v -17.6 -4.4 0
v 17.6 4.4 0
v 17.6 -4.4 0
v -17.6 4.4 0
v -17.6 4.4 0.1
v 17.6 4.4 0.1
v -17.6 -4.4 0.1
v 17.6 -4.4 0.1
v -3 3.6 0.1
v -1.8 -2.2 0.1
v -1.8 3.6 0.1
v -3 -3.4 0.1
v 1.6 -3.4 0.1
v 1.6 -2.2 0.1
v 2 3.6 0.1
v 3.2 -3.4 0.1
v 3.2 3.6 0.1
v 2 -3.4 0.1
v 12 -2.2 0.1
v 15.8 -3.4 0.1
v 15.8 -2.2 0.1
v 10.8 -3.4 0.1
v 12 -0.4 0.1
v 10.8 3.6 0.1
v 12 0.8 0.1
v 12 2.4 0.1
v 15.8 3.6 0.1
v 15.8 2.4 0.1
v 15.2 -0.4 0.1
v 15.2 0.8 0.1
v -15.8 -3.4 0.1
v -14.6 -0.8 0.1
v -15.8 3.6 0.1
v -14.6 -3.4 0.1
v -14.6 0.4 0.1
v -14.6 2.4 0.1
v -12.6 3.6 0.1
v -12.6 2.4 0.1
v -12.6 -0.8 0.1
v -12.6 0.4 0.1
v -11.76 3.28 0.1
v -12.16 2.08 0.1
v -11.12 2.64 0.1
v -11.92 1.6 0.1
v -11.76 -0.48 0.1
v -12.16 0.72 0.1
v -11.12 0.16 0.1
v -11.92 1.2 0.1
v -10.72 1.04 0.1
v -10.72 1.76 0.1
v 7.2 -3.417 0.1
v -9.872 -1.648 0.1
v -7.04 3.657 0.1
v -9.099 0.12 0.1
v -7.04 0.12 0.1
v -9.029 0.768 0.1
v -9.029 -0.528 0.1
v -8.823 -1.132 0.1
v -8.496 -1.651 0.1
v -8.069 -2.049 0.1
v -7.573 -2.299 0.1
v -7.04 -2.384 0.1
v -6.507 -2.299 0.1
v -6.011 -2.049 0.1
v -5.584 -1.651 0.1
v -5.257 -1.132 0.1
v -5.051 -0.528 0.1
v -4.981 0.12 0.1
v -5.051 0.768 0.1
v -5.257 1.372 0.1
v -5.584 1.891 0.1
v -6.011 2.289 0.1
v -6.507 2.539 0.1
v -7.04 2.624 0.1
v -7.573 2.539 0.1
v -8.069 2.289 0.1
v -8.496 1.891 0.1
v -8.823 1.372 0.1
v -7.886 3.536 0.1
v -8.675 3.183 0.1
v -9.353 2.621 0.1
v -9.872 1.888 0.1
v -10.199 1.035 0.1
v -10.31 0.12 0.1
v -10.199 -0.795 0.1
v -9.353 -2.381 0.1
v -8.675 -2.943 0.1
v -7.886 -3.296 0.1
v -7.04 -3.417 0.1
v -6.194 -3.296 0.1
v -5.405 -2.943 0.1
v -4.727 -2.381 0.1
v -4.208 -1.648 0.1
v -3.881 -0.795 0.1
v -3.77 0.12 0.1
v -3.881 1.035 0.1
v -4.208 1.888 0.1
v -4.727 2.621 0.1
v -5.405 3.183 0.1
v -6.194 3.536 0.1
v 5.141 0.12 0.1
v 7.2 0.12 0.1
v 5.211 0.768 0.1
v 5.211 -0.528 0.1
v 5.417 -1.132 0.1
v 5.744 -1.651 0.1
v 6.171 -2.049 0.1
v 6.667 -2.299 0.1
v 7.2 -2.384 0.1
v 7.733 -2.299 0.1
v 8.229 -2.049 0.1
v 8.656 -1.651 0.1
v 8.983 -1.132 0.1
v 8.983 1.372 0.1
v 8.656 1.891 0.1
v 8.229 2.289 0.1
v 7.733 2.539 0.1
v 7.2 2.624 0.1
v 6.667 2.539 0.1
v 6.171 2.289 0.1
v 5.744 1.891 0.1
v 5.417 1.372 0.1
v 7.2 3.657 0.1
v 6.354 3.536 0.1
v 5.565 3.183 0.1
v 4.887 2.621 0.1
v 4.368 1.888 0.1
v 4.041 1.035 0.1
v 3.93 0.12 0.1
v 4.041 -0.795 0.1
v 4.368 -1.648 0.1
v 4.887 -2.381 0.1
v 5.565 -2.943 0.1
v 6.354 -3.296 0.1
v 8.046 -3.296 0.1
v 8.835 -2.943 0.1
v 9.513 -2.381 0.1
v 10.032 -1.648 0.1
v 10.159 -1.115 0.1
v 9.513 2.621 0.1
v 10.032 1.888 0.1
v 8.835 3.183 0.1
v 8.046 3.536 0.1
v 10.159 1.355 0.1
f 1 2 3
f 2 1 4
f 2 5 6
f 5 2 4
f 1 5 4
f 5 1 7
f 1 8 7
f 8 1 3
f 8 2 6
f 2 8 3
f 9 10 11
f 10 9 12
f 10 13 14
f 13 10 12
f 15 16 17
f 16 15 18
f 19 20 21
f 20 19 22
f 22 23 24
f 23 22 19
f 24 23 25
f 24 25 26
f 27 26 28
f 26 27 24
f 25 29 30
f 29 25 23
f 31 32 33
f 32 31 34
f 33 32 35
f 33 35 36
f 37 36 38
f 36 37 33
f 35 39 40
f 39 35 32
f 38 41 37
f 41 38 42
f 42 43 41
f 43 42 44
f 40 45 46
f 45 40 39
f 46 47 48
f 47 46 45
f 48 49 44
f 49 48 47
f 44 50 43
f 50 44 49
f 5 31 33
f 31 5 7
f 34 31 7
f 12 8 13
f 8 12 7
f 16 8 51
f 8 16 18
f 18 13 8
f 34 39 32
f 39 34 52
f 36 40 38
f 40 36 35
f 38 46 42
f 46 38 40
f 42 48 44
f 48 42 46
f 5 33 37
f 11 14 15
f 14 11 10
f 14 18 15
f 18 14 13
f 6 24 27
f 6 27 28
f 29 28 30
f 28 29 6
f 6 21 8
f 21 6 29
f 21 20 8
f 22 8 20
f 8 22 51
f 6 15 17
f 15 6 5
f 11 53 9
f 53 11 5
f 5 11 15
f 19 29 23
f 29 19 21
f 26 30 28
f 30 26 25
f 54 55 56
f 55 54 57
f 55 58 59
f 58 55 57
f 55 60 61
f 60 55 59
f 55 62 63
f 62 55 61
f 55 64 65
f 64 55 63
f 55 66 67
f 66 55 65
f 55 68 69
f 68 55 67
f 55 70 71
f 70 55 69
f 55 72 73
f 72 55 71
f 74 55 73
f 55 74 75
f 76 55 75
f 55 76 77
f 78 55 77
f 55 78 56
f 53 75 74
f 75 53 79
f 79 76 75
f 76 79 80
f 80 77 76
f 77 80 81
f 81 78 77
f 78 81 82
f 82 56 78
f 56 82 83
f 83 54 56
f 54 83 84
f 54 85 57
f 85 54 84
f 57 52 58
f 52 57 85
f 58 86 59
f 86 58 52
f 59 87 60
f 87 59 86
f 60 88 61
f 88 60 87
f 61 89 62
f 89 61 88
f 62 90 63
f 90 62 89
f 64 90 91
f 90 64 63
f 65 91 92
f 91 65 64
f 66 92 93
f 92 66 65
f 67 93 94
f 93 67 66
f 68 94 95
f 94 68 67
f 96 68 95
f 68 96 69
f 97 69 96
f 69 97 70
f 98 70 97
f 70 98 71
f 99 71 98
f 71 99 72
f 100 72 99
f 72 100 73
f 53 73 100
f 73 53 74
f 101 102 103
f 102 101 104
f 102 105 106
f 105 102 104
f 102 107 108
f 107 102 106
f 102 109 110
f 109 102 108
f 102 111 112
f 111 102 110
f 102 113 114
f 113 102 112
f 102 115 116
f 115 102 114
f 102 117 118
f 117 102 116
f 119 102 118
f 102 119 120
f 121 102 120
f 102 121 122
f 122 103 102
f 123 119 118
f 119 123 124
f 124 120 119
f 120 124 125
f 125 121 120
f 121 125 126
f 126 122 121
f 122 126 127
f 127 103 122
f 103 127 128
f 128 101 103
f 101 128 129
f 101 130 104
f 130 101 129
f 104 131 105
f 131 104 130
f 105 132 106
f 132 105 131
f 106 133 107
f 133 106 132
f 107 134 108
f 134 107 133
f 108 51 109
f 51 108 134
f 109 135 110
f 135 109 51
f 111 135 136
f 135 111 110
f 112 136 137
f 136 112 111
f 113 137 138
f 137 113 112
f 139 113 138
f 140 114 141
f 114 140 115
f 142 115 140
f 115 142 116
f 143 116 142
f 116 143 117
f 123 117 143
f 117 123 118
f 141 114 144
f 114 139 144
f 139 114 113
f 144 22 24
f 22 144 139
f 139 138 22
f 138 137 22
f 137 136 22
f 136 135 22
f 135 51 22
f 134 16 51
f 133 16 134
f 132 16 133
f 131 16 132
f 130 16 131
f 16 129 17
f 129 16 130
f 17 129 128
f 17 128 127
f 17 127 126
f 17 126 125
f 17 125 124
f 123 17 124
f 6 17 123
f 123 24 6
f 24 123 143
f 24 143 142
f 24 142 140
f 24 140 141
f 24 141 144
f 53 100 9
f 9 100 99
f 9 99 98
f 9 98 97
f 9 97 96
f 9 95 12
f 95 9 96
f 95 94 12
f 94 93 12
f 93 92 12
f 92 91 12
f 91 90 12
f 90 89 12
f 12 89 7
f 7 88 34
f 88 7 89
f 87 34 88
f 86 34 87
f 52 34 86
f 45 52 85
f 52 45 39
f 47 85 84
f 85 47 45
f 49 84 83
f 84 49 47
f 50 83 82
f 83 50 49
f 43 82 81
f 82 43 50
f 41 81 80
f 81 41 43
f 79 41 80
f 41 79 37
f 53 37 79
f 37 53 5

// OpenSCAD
// file: ../p/box5-12.scad
use <../lib.scad>
function ldraw_lib__box5_12() = [
// 0 Box with 5 Faces without Any Edges
// 0 Name: box5-12.dat
// 0 Author: Chris Dee [cwdee]
// 0 !LDRAW_ORG Primitive UPDATE 2009-02
// 0 !LICENSE Licensed under CC BY 4.0 : see CAreadme.txt
// 
// 0 BFC CERTIFY CCW
  [0,"BFC","CERTIFY"],
  [0,"BFC","CCW"],
// 
// 0 !HISTORY 2009-09-03 [PTadmin] Official Update 2009-02
// 
// 
// 4 16 1 1 1 1 1 -1 -1 1 -1 -1 1 1
  [4,16,1,1,1,1,1,-1,-1,1,-1,-1,1,1],
// 4 16 -1 0 1 1 0 1 1 1 1 -1 1 1
  [4,16,-1,0,1,1,0,1,1,1,1,-1,1,1],
// 4 16 -1 0 -1 -1 0 1 -1 1 1 -1 1 -1
  [4,16,-1,0,-1,-1,0,1,-1,1,1,-1,1,-1],
// 4 16 1 0 -1 -1 0 -1 -1 1 -1 1 1 -1
  [4,16,1,0,-1,-1,0,-1,-1,1,-1,1,1,-1],
// 4 16 1 0 1 1 0 -1 1 1 -1 1 1 1
  [4,16,1,0,1,1,0,-1,1,1,-1,1,1,1],
// 0
];
module ldraw_lib__box5_12(step=0, col=false, unit=2/5, alt=false, line=0.2, solid=!$preview)
    makepoly(ldraw_lib__box5_12(), step=step, col=col, unit=unit, alt=alt, line=line, solid=solid);
ldraw_lib__box5_12(line=0.2);
// main file
use <../lib.scad>
use <../p/box5-12.scad>
function ldraw_lib__197875a() = [
// 0 Sticker  1.1 x  4.4 with White "Police"
// 0 Name: 197875a.dat
// 0 Author: Philippe Hurbain [Philo]
// 0 !LDRAW_ORG Part UPDATE 2015-01
// 0 !LICENSE Licensed under CC BY 4.0 : see CAreadme.txt
// 
// 0 BFC CERTIFY CCW
  [0,"BFC","CERTIFY"],
  [0,"BFC","CCW"],
// 
// 0 !KEYWORDS Set 4010
// 
// 0 !HISTORY 2015-10-11 [PTadmin] Official Update 2015-01
// 
// 
// 1 16 0 -0.25 0 44 0 0 0 0.25 0 0 0 11 box5-12.dat
  [1,16,0,-0.25,0,44,0,0,0,0.25,0,0,0,11, ldraw_lib__box5_12()],
// 4 15 -4.5 -0.25 9 -7.5 -0.25 9 -7.5 -0.25 -8.5 -4.5 -0.25 -5.5
  [4,15,-4.5,-0.25,9,-7.5,-0.25,9,-7.5,-0.25,-8.5,-4.5,-0.25,-5.5],
// 4 15 4 -0.25 -5.5 -4.5 -0.25 -5.5 -7.5 -0.25 -8.5 4 -0.25 -8.5
  [4,15,4,-0.25,-5.5,-4.5,-0.25,-5.5,-7.5,-0.25,-8.5,4,-0.25,-8.5],
// 4 15 8 -0.25 9 5 -0.25 9 5 -0.25 -8.5 8 -0.25 -8.5
  [4,15,8,-0.25,9,5,-0.25,9,5,-0.25,-8.5,8,-0.25,-8.5],
// 4 15 39.5 -0.25 -5.5 30 -0.25 -5.5 27 -0.25 -8.5 39.5 -0.25 -8.5
  [4,15,39.5,-0.25,-5.5,30,-0.25,-5.5,27,-0.25,-8.5,39.5,-0.25,-8.5],
// 4 15 27 -0.25 -8.5 30 -0.25 -5.5 30 -0.25 -1 27 -0.25 9
  [4,15,27,-0.25,-8.5,30,-0.25,-5.5,30,-0.25,-1,27,-0.25,9],
// 3 15 27 -0.25 9 30 -0.25 -1 30 -0.25 2
  [3,15,27,-0.25,9,30,-0.25,-1,30,-0.25,2],
// 3 15 27 -0.25 9 30 -0.25 2 30 -0.25 6
  [3,15,27,-0.25,9,30,-0.25,2,30,-0.25,6],
// 4 15 39.5 -0.25 9 27 -0.25 9 30 -0.25 6 39.5 -0.25 6
  [4,15,39.5,-0.25,9,27,-0.25,9,30,-0.25,6,39.5,-0.25,6],
// 4 15 30 -0.25 2 30 -0.25 -1 38 -0.25 -1 38 -0.25 2
  [4,15,30,-0.25,2,30,-0.25,-1,38,-0.25,-1,38,-0.25,2],
// 4 15 -39.5 -0.25 -8.5 -36.5 -0.25 -8.5 -36.5 -0.25 -2 -39.5 -0.25 9
  [4,15,-39.5,-0.25,-8.5,-36.5,-0.25,-8.5,-36.5,-0.25,-2,-39.5,-0.25,9],
// 3 15 -39.5 -0.25 9 -36.5 -0.25 -2 -36.5 -0.25 1
  [3,15,-39.5,-0.25,9,-36.5,-0.25,-2,-36.5,-0.25,1],
// 3 15 -39.5 -0.25 9 -36.5 -0.25 1 -36.5 -0.25 6
  [3,15,-39.5,-0.25,9,-36.5,-0.25,1,-36.5,-0.25,6],
// 4 15 -31.5 -0.25 9 -39.5 -0.25 9 -36.5 -0.25 6 -31.5 -0.25 6
  [4,15,-31.5,-0.25,9,-39.5,-0.25,9,-36.5,-0.25,6,-31.5,-0.25,6],
// 4 15 -36.5 -0.25 1 -36.5 -0.25 -2 -31.5 -0.25 -2 -31.5 -0.25 1
  [4,15,-36.5,-0.25,1,-36.5,-0.25,-2,-31.5,-0.25,-2,-31.5,-0.25,1],
// 4 15 -31.5 -0.25 9 -31.5 -0.25 6 -30.4 -0.25 5.2 -29.4 -0.25 8.2
  [4,15,-31.5,-0.25,9,-31.5,-0.25,6,-30.4,-0.25,5.2,-29.4,-0.25,8.2],
// 4 15 -27.8 -0.25 6.6 -29.4 -0.25 8.2 -30.4 -0.25 5.2 -29.8 -0.25 4
  [4,15,-27.8,-0.25,6.6,-29.4,-0.25,8.2,-30.4,-0.25,5.2,-29.8,-0.25,4],
// 4 15 -30.4 -0.25 1.8 -31.5 -0.25 1 -31.5 -0.25 -2 -29.4 -0.25 -1.2
  [4,15,-30.4,-0.25,1.8,-31.5,-0.25,1,-31.5,-0.25,-2,-29.4,-0.25,-1.2],
// 4 15 -30.4 -0.25 1.8 -29.4 -0.25 -1.2 -27.8 -0.25 0.4 -29.8 -0.25 3
  [4,15,-30.4,-0.25,1.8,-29.4,-0.25,-1.2,-27.8,-0.25,0.4,-29.8,-0.25,3],
// 4 15 -29.8 -0.25 3 -27.8 -0.25 0.4 -26.8 -0.25 2.6 -29.8 -0.25 4
  [4,15,-29.8,-0.25,3,-27.8,-0.25,0.4,-26.8,-0.25,2.6,-29.8,-0.25,4],
// 4 15 -26.8 -0.25 4.4 -27.8 -0.25 6.6 -29.8 -0.25 4 -26.8 -0.25 2.6
  [4,15,-26.8,-0.25,4.4,-27.8,-0.25,6.6,-29.8,-0.25,4,-26.8,-0.25,2.6],
// 4 16 -39.5 -0.25 9 -44 -0.25 11 -44 -0.25 -11 -39.5 -0.25 -8.5
  [4,16,-39.5,-0.25,9,-44,-0.25,11,-44,-0.25,-11,-39.5,-0.25,-8.5],
// 3 16 -36.5 -0.25 -8.5 -39.5 -0.25 -8.5 -44 -0.25 -11
  [3,16,-36.5,-0.25,-8.5,-39.5,-0.25,-8.5,-44,-0.25,-11],
// 4 16 4 -0.25 -8.5 -7.5 -0.25 -8.5 -44 -0.25 -11 44 -0.25 -11
  [4,16,4,-0.25,-8.5,-7.5,-0.25,-8.5,-44,-0.25,-11,44,-0.25,-11],
// 4 16 8 -0.25 -8.5 5 -0.25 -8.5 44 -0.25 -11 18 -0.25 -8.542
  [4,16,8,-0.25,-8.5,5,-0.25,-8.5,44,-0.25,-11,18,-0.25,-8.542],
// 3 16 5 -0.25 -8.5 4 -0.25 -8.5 44 -0.25 -11
  [3,16,5,-0.25,-8.5,4,-0.25,-8.5,44,-0.25,-11],
// 4 16 -31.5 -0.25 -2 -36.5 -0.25 -2 -36.5 -0.25 -8.5 -24.6806 -0.25 -4.121
  [4,16,-31.5,-0.25,-2,-36.5,-0.25,-2,-36.5,-0.25,-8.5,-24.6806,-0.25,-4.121],
// 4 16 -31.5 -0.25 6 -36.5 -0.25 6 -36.5 -0.25 1 -31.5 -0.25 1
  [4,16,-31.5,-0.25,6,-36.5,-0.25,6,-36.5,-0.25,1,-31.5,-0.25,1],
// 4 16 -31.5 -0.25 6 -31.5 -0.25 1 -30.4 -0.25 1.8 -30.4 -0.25 5.2
  [4,16,-31.5,-0.25,6,-31.5,-0.25,1,-30.4,-0.25,1.8,-30.4,-0.25,5.2],
// 4 16 -29.8 -0.25 4 -30.4 -0.25 5.2 -30.4 -0.25 1.8 -29.8 -0.25 3
  [4,16,-29.8,-0.25,4,-30.4,-0.25,5.2,-30.4,-0.25,1.8,-29.8,-0.25,3],
// 3 16 -44 -0.25 11 -39.5 -0.25 9 -31.5 -0.25 9
  [3,16,-44,-0.25,11,-39.5,-0.25,9,-31.5,-0.25,9],
// 4 16 -4.5 -0.25 9 -4.5 -0.25 -5.5 4 -0.25 -5.5 5 -0.25 9
  [4,16,-4.5,-0.25,9,-4.5,-0.25,-5.5,4,-0.25,-5.5,5,-0.25,9],
// 4 16 5 -0.25 -8.5 5 -0.25 9 4 -0.25 -5.5 4 -0.25 -8.5
  [4,16,5,-0.25,-8.5,5,-0.25,9,4,-0.25,-5.5,4,-0.25,-8.5],
// 3 16 44 -0.25 11 27 -0.25 9 39.5 -0.25 9
  [3,16,44,-0.25,11,27,-0.25,9,39.5,-0.25,9],
// 3 16 44 -0.25 11 39.5 -0.25 9 39.5 -0.25 6
  [3,16,44,-0.25,11,39.5,-0.25,9,39.5,-0.25,6],
// 4 16 44 -0.25 11 39.5 -0.25 6 38 -0.25 2 38 -0.25 -1
  [4,16,44,-0.25,11,39.5,-0.25,6,38,-0.25,2,38,-0.25,-1],
// 4 16 44 -0.25 11 38 -0.25 -1 39.5 -0.25 -5.5 44 -0.25 -11
  [4,16,44,-0.25,11,38,-0.25,-1,39.5,-0.25,-5.5,44,-0.25,-11],
// 3 16 39.5 -0.25 -5.5 39.5 -0.25 -8.5 44 -0.25 -11
  [3,16,39.5,-0.25,-5.5,39.5,-0.25,-8.5,44,-0.25,-11],
// 4 16 44 -0.25 -11 39.5 -0.25 -8.5 27 -0.25 -8.5 18 -0.25 -8.542
  [4,16,44,-0.25,-11,39.5,-0.25,-8.5,27,-0.25,-8.5,18,-0.25,-8.542],
// 4 16 5 -0.25 9 8 -0.25 9 44 -0.25 11 -44 -0.25 11
  [4,16,5,-0.25,9,8,-0.25,9,44,-0.25,11,-44,-0.25,11],
// 4 16 -7.5 -0.25 9 -4.5 -0.25 9 -44 -0.25 11 -17.6 -0.25 9.142
  [4,16,-7.5,-0.25,9,-4.5,-0.25,9,-44,-0.25,11,-17.6,-0.25,9.142],
// 3 16 -44 -0.25 11 -4.5 -0.25 9 5 -0.25 9
  [3,16,-44,-0.25,11,-4.5,-0.25,9,5,-0.25,9],
// 4 16 38 -0.25 -1 30 -0.25 -1 30 -0.25 -5.5 39.5 -0.25 -5.5
  [4,16,38,-0.25,-1,30,-0.25,-1,30,-0.25,-5.5,39.5,-0.25,-5.5],
// 4 16 30 -0.25 6 30 -0.25 2 38 -0.25 2 39.5 -0.25 6
  [4,16,30,-0.25,6,30,-0.25,2,38,-0.25,2,39.5,-0.25,6],
// 4 16 -17.6 -0.25 0.3 -22.5716 -0.25 1.9202 -22.747 -0.25 0.3 -22.5716 -0.25 -1.3202
  [4,16,-17.6,-0.25,0.3,-22.5716,-0.25,1.9202,-22.747,-0.25,0.3,-22.5716,-0.25,-1.3202],
// 4 16 -17.6 -0.25 0.3 -22.5716 -0.25 -1.3202 -22.0574 -0.25 -2.83 -21.2395 -0.25 -4.1265
  [4,16,-17.6,-0.25,0.3,-22.5716,-0.25,-1.3202,-22.0574,-0.25,-2.83,-21.2395,-0.25,-4.1265],
// 4 16 -17.6 -0.25 0.3 -21.2395 -0.25 -4.1265 -20.1735 -0.25 -5.1213 -18.9321 -0.25 -5.7467
  [4,16,-17.6,-0.25,0.3,-21.2395,-0.25,-4.1265,-20.1735,-0.25,-5.1213,-18.9321,-0.25,-5.7467],
// 4 16 -17.6 -0.25 0.3 -18.9321 -0.25 -5.7467 -17.6 -0.25 -5.96 -16.2679 -0.25 -5.7467
  [4,16,-17.6,-0.25,0.3,-18.9321,-0.25,-5.7467,-17.6,-0.25,-5.96,-16.2679,-0.25,-5.7467],
// 4 16 -17.6 -0.25 0.3 -16.2679 -0.25 -5.7467 -15.0265 -0.25 -5.1213 -13.9605 -0.25 -4.1265
  [4,16,-17.6,-0.25,0.3,-16.2679,-0.25,-5.7467,-15.0265,-0.25,-5.1213,-13.9605,-0.25,-4.1265],
// 4 16 -17.6 -0.25 0.3 -13.9605 -0.25 -4.1265 -13.1426 -0.25 -2.83 -12.6284 -0.25 -1.3202
  [4,16,-17.6,-0.25,0.3,-13.9605,-0.25,-4.1265,-13.1426,-0.25,-2.83,-12.6284,-0.25,-1.3202],
// 4 16 -17.6 -0.25 0.3 -12.6284 -0.25 -1.3202 -12.453 -0.25 0.3 -12.6284 -0.25 1.9202
  [4,16,-17.6,-0.25,0.3,-12.6284,-0.25,-1.3202,-12.453,-0.25,0.3,-12.6284,-0.25,1.9202],
// 4 16 -17.6 -0.25 0.3 -12.6284 -0.25 1.9202 -13.1426 -0.25 3.43 -13.9605 -0.25 4.7265
  [4,16,-17.6,-0.25,0.3,-12.6284,-0.25,1.9202,-13.1426,-0.25,3.43,-13.9605,-0.25,4.7265],
// 4 16 -17.6 -0.25 0.3 -13.9605 -0.25 4.7265 -15.0265 -0.25 5.7213 -16.2679 -0.25 6.3467
  [4,16,-17.6,-0.25,0.3,-13.9605,-0.25,4.7265,-15.0265,-0.25,5.7213,-16.2679,-0.25,6.3467],
// 4 16 -17.6 -0.25 0.3 -16.2679 -0.25 6.3467 -17.6 -0.25 6.56 -18.9321 -0.25 6.3467
  [4,16,-17.6,-0.25,0.3,-16.2679,-0.25,6.3467,-17.6,-0.25,6.56,-18.9321,-0.25,6.3467],
// 4 16 -17.6 -0.25 0.3 -18.9321 -0.25 6.3467 -20.1735 -0.25 5.7213 -21.2395 -0.25 4.7265
  [4,16,-17.6,-0.25,0.3,-18.9321,-0.25,6.3467,-20.1735,-0.25,5.7213,-21.2395,-0.25,4.7265],
// 4 16 -17.6 -0.25 0.3 -21.2395 -0.25 4.7265 -22.0574 -0.25 3.43 -22.5716 -0.25 1.9202
  [4,16,-17.6,-0.25,0.3,-21.2395,-0.25,4.7265,-22.0574,-0.25,3.43,-22.5716,-0.25,1.9202],
// 4 15 -17.6 -0.25 6.56 -17.6 -0.25 9.142 -19.7161 -0.25 8.8407 -18.9321 -0.25 6.3467
  [4,15,-17.6,-0.25,6.56,-17.6,-0.25,9.142,-19.7161,-0.25,8.8407,-18.9321,-0.25,6.3467],
// 4 15 -18.9321 -0.25 6.3467 -19.7161 -0.25 8.8407 -21.688 -0.25 7.9574 -20.1735 -0.25 5.7213
  [4,15,-18.9321,-0.25,6.3467,-19.7161,-0.25,8.8407,-21.688,-0.25,7.9574,-20.1735,-0.25,5.7213],
// 4 15 -20.1735 -0.25 5.7213 -21.688 -0.25 7.9574 -23.3813 -0.25 6.5522 -21.2395 -0.25 4.7265
  [4,15,-20.1735,-0.25,5.7213,-21.688,-0.25,7.9574,-23.3813,-0.25,6.5522,-21.2395,-0.25,4.7265],
// 4 15 -21.2395 -0.25 4.7265 -23.3813 -0.25 6.5522 -24.6806 -0.25 4.721 -22.0574 -0.25 3.43
  [4,15,-21.2395,-0.25,4.7265,-23.3813,-0.25,6.5522,-24.6806,-0.25,4.721,-22.0574,-0.25,3.43],
// 4 15 -22.0574 -0.25 3.43 -24.6806 -0.25 4.721 -25.4974 -0.25 2.5885 -22.5716 -0.25 1.9202
  [4,15,-22.0574,-0.25,3.43,-24.6806,-0.25,4.721,-25.4974,-0.25,2.5885,-22.5716,-0.25,1.9202],
// 4 15 -22.5716 -0.25 1.9202 -25.4974 -0.25 2.5885 -25.776 -0.25 0.3 -22.747 -0.25 0.3
  [4,15,-22.5716,-0.25,1.9202,-25.4974,-0.25,2.5885,-25.776,-0.25,0.3,-22.747,-0.25,0.3],
// 4 15 -22.747 -0.25 0.3 -25.776 -0.25 0.3 -25.4974 -0.25 -1.9885 -22.5716 -0.25 -1.3202
  [4,15,-22.747,-0.25,0.3,-25.776,-0.25,0.3,-25.4974,-0.25,-1.9885,-22.5716,-0.25,-1.3202],
// 4 15 -22.5716 -0.25 -1.3202 -25.4974 -0.25 -1.9885 -24.6806 -0.25 -4.121 -22.0574 -0.25 -2.83
  [4,15,-22.5716,-0.25,-1.3202,-25.4974,-0.25,-1.9885,-24.6806,-0.25,-4.121,-22.0574,-0.25,-2.83],
// 4 15 -22.0574 -0.25 -2.83 -24.6806 -0.25 -4.121 -23.3813 -0.25 -5.9522 -21.2395 -0.25 -4.1265
  [4,15,-22.0574,-0.25,-2.83,-24.6806,-0.25,-4.121,-23.3813,-0.25,-5.9522,-21.2395,-0.25,-4.1265],
// 4 15 -21.2395 -0.25 -4.1265 -23.3813 -0.25 -5.9522 -21.688 -0.25 -7.3574 -20.1735 -0.25 -5.1213
  [4,15,-21.2395,-0.25,-4.1265,-23.3813,-0.25,-5.9522,-21.688,-0.25,-7.3574,-20.1735,-0.25,-5.1213],
// 4 15 -20.1735 -0.25 -5.1213 -21.688 -0.25 -7.3574 -19.7161 -0.25 -8.2407 -18.9321 -0.25 -5.7467
  [4,15,-20.1735,-0.25,-5.1213,-21.688,-0.25,-7.3574,-19.7161,-0.25,-8.2407,-18.9321,-0.25,-5.7467],
// 4 15 -18.9321 -0.25 -5.7467 -19.7161 -0.25 -8.2407 -17.6 -0.25 -8.542 -17.6 -0.25 -5.96
  [4,15,-18.9321,-0.25,-5.7467,-19.7161,-0.25,-8.2407,-17.6,-0.25,-8.542,-17.6,-0.25,-5.96],
// 4 15 -17.6 -0.25 -5.96 -17.6 -0.25 -8.542 -15.4839 -0.25 -8.2407 -16.2679 -0.25 -5.7467
  [4,15,-17.6,-0.25,-5.96,-17.6,-0.25,-8.542,-15.4839,-0.25,-8.2407,-16.2679,-0.25,-5.7467],
// 4 15 -16.2679 -0.25 -5.7467 -15.4839 -0.25 -8.2407 -13.512 -0.25 -7.3574 -15.0265 -0.25 -5.1213
  [4,15,-16.2679,-0.25,-5.7467,-15.4839,-0.25,-8.2407,-13.512,-0.25,-7.3574,-15.0265,-0.25,-5.1213],
// 4 15 -15.0265 -0.25 -5.1213 -13.512 -0.25 -7.3574 -11.8187 -0.25 -5.9522 -13.9605 -0.25 -4.1265
  [4,15,-15.0265,-0.25,-5.1213,-13.512,-0.25,-7.3574,-11.8187,-0.25,-5.9522,-13.9605,-0.25,-4.1265],
// 4 15 -13.9605 -0.25 -4.1265 -11.8187 -0.25 -5.9522 -10.5194 -0.25 -4.121 -13.1426 -0.25 -2.83
  [4,15,-13.9605,-0.25,-4.1265,-11.8187,-0.25,-5.9522,-10.5194,-0.25,-4.121,-13.1426,-0.25,-2.83],
// 4 15 -13.1426 -0.25 -2.83 -10.5194 -0.25 -4.121 -9.7026 -0.25 -1.9885 -12.6284 -0.25 -1.3202
  [4,15,-13.1426,-0.25,-2.83,-10.5194,-0.25,-4.121,-9.7026,-0.25,-1.9885,-12.6284,-0.25,-1.3202],
// 4 15 -12.6284 -0.25 -1.3202 -9.7026 -0.25 -1.9885 -9.424 -0.25 0.3 -12.453 -0.25 0.3
  [4,15,-12.6284,-0.25,-1.3202,-9.7026,-0.25,-1.9885,-9.424,-0.25,0.3,-12.453,-0.25,0.3],
// 4 15 -12.453 -0.25 0.3 -9.424 -0.25 0.3 -9.7026 -0.25 2.5885 -12.6284 -0.25 1.9202
  [4,15,-12.453,-0.25,0.3,-9.424,-0.25,0.3,-9.7026,-0.25,2.5885,-12.6284,-0.25,1.9202],
// 4 15 -12.6284 -0.25 1.9202 -9.7026 -0.25 2.5885 -10.5194 -0.25 4.721 -13.1426 -0.25 3.43
  [4,15,-12.6284,-0.25,1.9202,-9.7026,-0.25,2.5885,-10.5194,-0.25,4.721,-13.1426,-0.25,3.43],
// 4 15 -13.1426 -0.25 3.43 -10.5194 -0.25 4.721 -11.8187 -0.25 6.5522 -13.9605 -0.25 4.7265
  [4,15,-13.1426,-0.25,3.43,-10.5194,-0.25,4.721,-11.8187,-0.25,6.5522,-13.9605,-0.25,4.7265],
// 4 15 -13.9605 -0.25 4.7265 -11.8187 -0.25 6.5522 -13.512 -0.25 7.9574 -15.0265 -0.25 5.7213
  [4,15,-13.9605,-0.25,4.7265,-11.8187,-0.25,6.5522,-13.512,-0.25,7.9574,-15.0265,-0.25,5.7213],
// 4 15 -15.0265 -0.25 5.7213 -13.512 -0.25 7.9574 -15.4839 -0.25 8.8407 -16.2679 -0.25 6.3467
  [4,15,-15.0265,-0.25,5.7213,-13.512,-0.25,7.9574,-15.4839,-0.25,8.8407,-16.2679,-0.25,6.3467],
// 4 15 -16.2679 -0.25 6.3467 -15.4839 -0.25 8.8407 -17.6 -0.25 9.142 -17.6 -0.25 6.56
  [4,15,-16.2679,-0.25,6.3467,-15.4839,-0.25,8.8407,-17.6,-0.25,9.142,-17.6,-0.25,6.56],
// 4 16 18 -0.25 0.3 13.0284 -0.25 1.9202 12.853 -0.25 0.3 13.0284 -0.25 -1.3202
  [4,16,18,-0.25,0.3,13.0284,-0.25,1.9202,12.853,-0.25,0.3,13.0284,-0.25,-1.3202],
// 4 16 18 -0.25 0.3 13.0284 -0.25 -1.3202 13.5426 -0.25 -2.83 14.3605 -0.25 -4.1265
  [4,16,18,-0.25,0.3,13.0284,-0.25,-1.3202,13.5426,-0.25,-2.83,14.3605,-0.25,-4.1265],
// 4 16 18 -0.25 0.3 14.3605 -0.25 -4.1265 15.4265 -0.25 -5.1213 16.6679 -0.25 -5.7467
  [4,16,18,-0.25,0.3,14.3605,-0.25,-4.1265,15.4265,-0.25,-5.1213,16.6679,-0.25,-5.7467],
// 4 16 18 -0.25 0.3 16.6679 -0.25 -5.7467 18 -0.25 -5.96 19.3321 -0.25 -5.7467
  [4,16,18,-0.25,0.3,16.6679,-0.25,-5.7467,18,-0.25,-5.96,19.3321,-0.25,-5.7467],
// 4 16 18 -0.25 0.3 19.3321 -0.25 -5.7467 20.5735 -0.25 -5.1213 21.6395 -0.25 -4.1265
  [4,16,18,-0.25,0.3,19.3321,-0.25,-5.7467,20.5735,-0.25,-5.1213,21.6395,-0.25,-4.1265],
// 4 16 18 -0.25 0.3 21.6395 -0.25 -4.1265 22.4574 -0.25 -2.83 22.4574 -0.25 3.43
  [4,16,18,-0.25,0.3,21.6395,-0.25,-4.1265,22.4574,-0.25,-2.83,22.4574,-0.25,3.43],
// 4 16 18 -0.25 0.3 22.4574 -0.25 3.43 21.6395 -0.25 4.7265 20.5735 -0.25 5.7213
  [4,16,18,-0.25,0.3,22.4574,-0.25,3.43,21.6395,-0.25,4.7265,20.5735,-0.25,5.7213],
// 4 16 18 -0.25 0.3 20.5735 -0.25 5.7213 19.3321 -0.25 6.3467 18 -0.25 6.56
  [4,16,18,-0.25,0.3,20.5735,-0.25,5.7213,19.3321,-0.25,6.3467,18,-0.25,6.56],
// 4 16 18 -0.25 0.3 18 -0.25 6.56 16.6679 -0.25 6.3467 15.4265 -0.25 5.7213
  [4,16,18,-0.25,0.3,18,-0.25,6.56,16.6679,-0.25,6.3467,15.4265,-0.25,5.7213],
// 4 16 18 -0.25 0.3 15.4265 -0.25 5.7213 14.3605 -0.25 4.7265 13.5426 -0.25 3.43
  [4,16,18,-0.25,0.3,15.4265,-0.25,5.7213,14.3605,-0.25,4.7265,13.5426,-0.25,3.43],
// 3 16 13.5426 -0.25 3.43 13.0284 -0.25 1.9202 18 -0.25 0.3
  [3,16,13.5426,-0.25,3.43,13.0284,-0.25,1.9202,18,-0.25,0.3],
// 4 15 18 -0.25 6.56 18 -0.25 9.142 15.8839 -0.25 8.8407 16.6679 -0.25 6.3467
  [4,15,18,-0.25,6.56,18,-0.25,9.142,15.8839,-0.25,8.8407,16.6679,-0.25,6.3467],
// 4 15 16.6679 -0.25 6.3467 15.8839 -0.25 8.8407 13.912 -0.25 7.9574 15.4265 -0.25 5.7213
  [4,15,16.6679,-0.25,6.3467,15.8839,-0.25,8.8407,13.912,-0.25,7.9574,15.4265,-0.25,5.7213],
// 4 15 15.4265 -0.25 5.7213 13.912 -0.25 7.9574 12.2187 -0.25 6.5522 14.3605 -0.25 4.7265
  [4,15,15.4265,-0.25,5.7213,13.912,-0.25,7.9574,12.2187,-0.25,6.5522,14.3605,-0.25,4.7265],
// 4 15 14.3605 -0.25 4.7265 12.2187 -0.25 6.5522 10.9194 -0.25 4.721 13.5426 -0.25 3.43
  [4,15,14.3605,-0.25,4.7265,12.2187,-0.25,6.5522,10.9194,-0.25,4.721,13.5426,-0.25,3.43],
// 4 15 13.5426 -0.25 3.43 10.9194 -0.25 4.721 10.1026 -0.25 2.5885 13.0284 -0.25 1.9202
  [4,15,13.5426,-0.25,3.43,10.9194,-0.25,4.721,10.1026,-0.25,2.5885,13.0284,-0.25,1.9202],
// 4 15 13.0284 -0.25 1.9202 10.1026 -0.25 2.5885 9.824 -0.25 0.3 12.853 -0.25 0.3
  [4,15,13.0284,-0.25,1.9202,10.1026,-0.25,2.5885,9.824,-0.25,0.3,12.853,-0.25,0.3],
// 4 15 12.853 -0.25 0.3 9.824 -0.25 0.3 10.1026 -0.25 -1.9885 13.0284 -0.25 -1.3202
  [4,15,12.853,-0.25,0.3,9.824,-0.25,0.3,10.1026,-0.25,-1.9885,13.0284,-0.25,-1.3202],
// 4 15 13.0284 -0.25 -1.3202 10.1026 -0.25 -1.9885 10.9194 -0.25 -4.121 13.5426 -0.25 -2.83
  [4,15,13.0284,-0.25,-1.3202,10.1026,-0.25,-1.9885,10.9194,-0.25,-4.121,13.5426,-0.25,-2.83],
// 4 15 13.5426 -0.25 -2.83 10.9194 -0.25 -4.121 12.2187 -0.25 -5.9522 14.3605 -0.25 -4.1265
  [4,15,13.5426,-0.25,-2.83,10.9194,-0.25,-4.121,12.2187,-0.25,-5.9522,14.3605,-0.25,-4.1265],
// 4 15 14.3605 -0.25 -4.1265 12.2187 -0.25 -5.9522 13.912 -0.25 -7.3574 15.4265 -0.25 -5.1213
  [4,15,14.3605,-0.25,-4.1265,12.2187,-0.25,-5.9522,13.912,-0.25,-7.3574,15.4265,-0.25,-5.1213],
// 4 15 15.4265 -0.25 -5.1213 13.912 -0.25 -7.3574 15.8839 -0.25 -8.2407 16.6679 -0.25 -5.7467
  [4,15,15.4265,-0.25,-5.1213,13.912,-0.25,-7.3574,15.8839,-0.25,-8.2407,16.6679,-0.25,-5.7467],
// 4 15 16.6679 -0.25 -5.7467 15.8839 -0.25 -8.2407 18 -0.25 -8.542 18 -0.25 -5.96
  [4,15,16.6679,-0.25,-5.7467,15.8839,-0.25,-8.2407,18,-0.25,-8.542,18,-0.25,-5.96],
// 4 15 18 -0.25 -5.96 18 -0.25 -8.542 20.1161 -0.25 -8.2407 19.3321 -0.25 -5.7467
  [4,15,18,-0.25,-5.96,18,-0.25,-8.542,20.1161,-0.25,-8.2407,19.3321,-0.25,-5.7467],
// 4 15 19.3321 -0.25 -5.7467 20.1161 -0.25 -8.2407 22.088 -0.25 -7.3574 20.5735 -0.25 -5.1213
  [4,15,19.3321,-0.25,-5.7467,20.1161,-0.25,-8.2407,22.088,-0.25,-7.3574,20.5735,-0.25,-5.1213],
// 4 15 20.5735 -0.25 -5.1213 22.088 -0.25 -7.3574 23.7813 -0.25 -5.9522 21.6395 -0.25 -4.1265
  [4,15,20.5735,-0.25,-5.1213,22.088,-0.25,-7.3574,23.7813,-0.25,-5.9522,21.6395,-0.25,-4.1265],
// 4 15 21.6395 -0.25 -4.1265 23.7813 -0.25 -5.9522 25.0806 -0.25 -4.121 22.4574 -0.25 -2.83
  [4,15,21.6395,-0.25,-4.1265,23.7813,-0.25,-5.9522,25.0806,-0.25,-4.121,22.4574,-0.25,-2.83],
// 3 15 25.3974 -0.25 -2.7885 22.4574 -0.25 -2.83 25.0806 -0.25 -4.121
  [3,15,25.3974,-0.25,-2.7885,22.4574,-0.25,-2.83,25.0806,-0.25,-4.121],
// 4 15 22.4574 -0.25 3.43 25.0806 -0.25 4.721 23.7813 -0.25 6.5522 21.6395 -0.25 4.7265
  [4,15,22.4574,-0.25,3.43,25.0806,-0.25,4.721,23.7813,-0.25,6.5522,21.6395,-0.25,4.7265],
// 4 15 21.6395 -0.25 4.7265 23.7813 -0.25 6.5522 22.088 -0.25 7.9574 20.5735 -0.25 5.7213
  [4,15,21.6395,-0.25,4.7265,23.7813,-0.25,6.5522,22.088,-0.25,7.9574,20.5735,-0.25,5.7213],
// 4 15 20.5735 -0.25 5.7213 22.088 -0.25 7.9574 20.1161 -0.25 8.8407 19.3321 -0.25 6.3467
  [4,15,20.5735,-0.25,5.7213,22.088,-0.25,7.9574,20.1161,-0.25,8.8407,19.3321,-0.25,6.3467],
// 4 15 19.3321 -0.25 6.3467 20.1161 -0.25 8.8407 18 -0.25 9.142 18 -0.25 6.56
  [4,15,19.3321,-0.25,6.3467,20.1161,-0.25,8.8407,18,-0.25,9.142,18,-0.25,6.56],
// 3 15 25.0806 -0.25 4.721 22.4574 -0.25 3.43 25.3974 -0.25 3.3885
  [3,15,25.0806,-0.25,4.721,22.4574,-0.25,3.43,25.3974,-0.25,3.3885],
// 4 16 22.4574 -0.25 3.43 22.4574 -0.25 -2.83 25.3974 -0.25 -2.7885 25.3974 -0.25 3.3885
  [4,16,22.4574,-0.25,3.43,22.4574,-0.25,-2.83,25.3974,-0.25,-2.7885,25.3974,-0.25,3.3885],
// 4 16 27 -0.25 9 25.3974 -0.25 3.3885 25.3974 -0.25 -2.7885 27 -0.25 -8.5
  [4,16,27,-0.25,9,25.3974,-0.25,3.3885,25.3974,-0.25,-2.7885,27,-0.25,-8.5],
// 3 16 25.3974 -0.25 -2.7885 25.0806 -0.25 -4.121 27 -0.25 -8.5
  [3,16,25.3974,-0.25,-2.7885,25.0806,-0.25,-4.121,27,-0.25,-8.5],
// 3 16 25.0806 -0.25 -4.121 23.7813 -0.25 -5.9522 27 -0.25 -8.5
  [3,16,25.0806,-0.25,-4.121,23.7813,-0.25,-5.9522,27,-0.25,-8.5],
// 3 16 23.7813 -0.25 -5.9522 22.088 -0.25 -7.3574 27 -0.25 -8.5
  [3,16,23.7813,-0.25,-5.9522,22.088,-0.25,-7.3574,27,-0.25,-8.5],
// 3 16 22.088 -0.25 -7.3574 20.1161 -0.25 -8.2407 27 -0.25 -8.5
  [3,16,22.088,-0.25,-7.3574,20.1161,-0.25,-8.2407,27,-0.25,-8.5],
// 3 16 20.1161 -0.25 -8.2407 18 -0.25 -8.542 27 -0.25 -8.5
  [3,16,20.1161,-0.25,-8.2407,18,-0.25,-8.542,27,-0.25,-8.5],
// 3 16 15.8839 -0.25 -8.2407 8 -0.25 -8.5 18 -0.25 -8.542
  [3,16,15.8839,-0.25,-8.2407,8,-0.25,-8.5,18,-0.25,-8.542],
// 3 16 13.912 -0.25 -7.3574 8 -0.25 -8.5 15.8839 -0.25 -8.2407
  [3,16,13.912,-0.25,-7.3574,8,-0.25,-8.5,15.8839,-0.25,-8.2407],
// 3 16 12.2187 -0.25 -5.9522 8 -0.25 -8.5 13.912 -0.25 -7.3574
  [3,16,12.2187,-0.25,-5.9522,8,-0.25,-8.5,13.912,-0.25,-7.3574],
// 3 16 10.9194 -0.25 -4.121 8 -0.25 -8.5 12.2187 -0.25 -5.9522
  [3,16,10.9194,-0.25,-4.121,8,-0.25,-8.5,12.2187,-0.25,-5.9522],
// 3 16 10.1026 -0.25 -1.9885 8 -0.25 -8.5 10.9194 -0.25 -4.121
  [3,16,10.1026,-0.25,-1.9885,8,-0.25,-8.5,10.9194,-0.25,-4.121],
// 4 16 8 -0.25 -8.5 10.1026 -0.25 -1.9885 9.824 -0.25 0.3 8 -0.25 9
  [4,16,8,-0.25,-8.5,10.1026,-0.25,-1.9885,9.824,-0.25,0.3,8,-0.25,9],
// 3 16 8 -0.25 9 9.824 -0.25 0.3 10.1026 -0.25 2.5885
  [3,16,8,-0.25,9,9.824,-0.25,0.3,10.1026,-0.25,2.5885],
// 3 16 8 -0.25 9 10.1026 -0.25 2.5885 10.9194 -0.25 4.721
  [3,16,8,-0.25,9,10.1026,-0.25,2.5885,10.9194,-0.25,4.721],
// 3 16 8 -0.25 9 10.9194 -0.25 4.721 12.2187 -0.25 6.5522
  [3,16,8,-0.25,9,10.9194,-0.25,4.721,12.2187,-0.25,6.5522],
// 3 16 8 -0.25 9 12.2187 -0.25 6.5522 13.912 -0.25 7.9574
  [3,16,8,-0.25,9,12.2187,-0.25,6.5522,13.912,-0.25,7.9574],
// 3 16 8 -0.25 9 13.912 -0.25 7.9574 15.8839 -0.25 8.8407
  [3,16,8,-0.25,9,13.912,-0.25,7.9574,15.8839,-0.25,8.8407],
// 3 16 18 -0.25 9.142 8 -0.25 9 15.8839 -0.25 8.8407
  [3,16,18,-0.25,9.142,8,-0.25,9,15.8839,-0.25,8.8407],
// 3 16 44 -0.25 11 8 -0.25 9 18 -0.25 9.142
  [3,16,44,-0.25,11,8,-0.25,9,18,-0.25,9.142],
// 4 16 44 -0.25 11 18 -0.25 9.142 20.1161 -0.25 8.8407 27 -0.25 9
  [4,16,44,-0.25,11,18,-0.25,9.142,20.1161,-0.25,8.8407,27,-0.25,9],
// 3 16 27 -0.25 9 20.1161 -0.25 8.8407 22.088 -0.25 7.9574
  [3,16,27,-0.25,9,20.1161,-0.25,8.8407,22.088,-0.25,7.9574],
// 3 16 27 -0.25 9 22.088 -0.25 7.9574 23.7813 -0.25 6.5522
  [3,16,27,-0.25,9,22.088,-0.25,7.9574,23.7813,-0.25,6.5522],
// 3 16 27 -0.25 9 23.7813 -0.25 6.5522 25.0806 -0.25 4.721
  [3,16,27,-0.25,9,23.7813,-0.25,6.5522,25.0806,-0.25,4.721],
// 3 16 27 -0.25 9 25.0806 -0.25 4.721 25.3974 -0.25 3.3885
  [3,16,27,-0.25,9,25.0806,-0.25,4.721,25.3974,-0.25,3.3885],
// 3 16 -17.6 -0.25 9.142 -15.4839 -0.25 8.8407 -7.5 -0.25 9
  [3,16,-17.6,-0.25,9.142,-15.4839,-0.25,8.8407,-7.5,-0.25,9],
// 3 16 -7.5 -0.25 9 -15.4839 -0.25 8.8407 -13.512 -0.25 7.9574
  [3,16,-7.5,-0.25,9,-15.4839,-0.25,8.8407,-13.512,-0.25,7.9574],
// 3 16 -7.5 -0.25 9 -13.512 -0.25 7.9574 -11.8187 -0.25 6.5522
  [3,16,-7.5,-0.25,9,-13.512,-0.25,7.9574,-11.8187,-0.25,6.5522],
// 3 16 -7.5 -0.25 9 -11.8187 -0.25 6.5522 -10.5194 -0.25 4.721
  [3,16,-7.5,-0.25,9,-11.8187,-0.25,6.5522,-10.5194,-0.25,4.721],
// 3 16 -7.5 -0.25 9 -10.5194 -0.25 4.721 -9.7026 -0.25 2.5885
  [3,16,-7.5,-0.25,9,-10.5194,-0.25,4.721,-9.7026,-0.25,2.5885],
// 4 16 -7.5 -0.25 9 -9.7026 -0.25 2.5885 -9.424 -0.25 0.3 -7.5 -0.25 -8.5
  [4,16,-7.5,-0.25,9,-9.7026,-0.25,2.5885,-9.424,-0.25,0.3,-7.5,-0.25,-8.5],
// 3 16 -9.424 -0.25 0.3 -9.7026 -0.25 -1.9885 -7.5 -0.25 -8.5
  [3,16,-9.424,-0.25,0.3,-9.7026,-0.25,-1.9885,-7.5,-0.25,-8.5],
// 3 16 -9.7026 -0.25 -1.9885 -10.5194 -0.25 -4.121 -7.5 -0.25 -8.5
  [3,16,-9.7026,-0.25,-1.9885,-10.5194,-0.25,-4.121,-7.5,-0.25,-8.5],
// 3 16 -10.5194 -0.25 -4.121 -11.8187 -0.25 -5.9522 -7.5 -0.25 -8.5
  [3,16,-10.5194,-0.25,-4.121,-11.8187,-0.25,-5.9522,-7.5,-0.25,-8.5],
// 3 16 -11.8187 -0.25 -5.9522 -13.512 -0.25 -7.3574 -7.5 -0.25 -8.5
  [3,16,-11.8187,-0.25,-5.9522,-13.512,-0.25,-7.3574,-7.5,-0.25,-8.5],
// 3 16 -13.512 -0.25 -7.3574 -15.4839 -0.25 -8.2407 -7.5 -0.25 -8.5
  [3,16,-13.512,-0.25,-7.3574,-15.4839,-0.25,-8.2407,-7.5,-0.25,-8.5],
// 3 16 -15.4839 -0.25 -8.2407 -17.6 -0.25 -8.542 -7.5 -0.25 -8.5
  [3,16,-15.4839,-0.25,-8.2407,-17.6,-0.25,-8.542,-7.5,-0.25,-8.5],
// 3 16 -7.5 -0.25 -8.5 -17.6 -0.25 -8.542 -44 -0.25 -11
  [3,16,-7.5,-0.25,-8.5,-17.6,-0.25,-8.542,-44,-0.25,-11],
// 4 16 -44 -0.25 -11 -17.6 -0.25 -8.542 -19.7161 -0.25 -8.2407 -36.5 -0.25 -8.5
  [4,16,-44,-0.25,-11,-17.6,-0.25,-8.542,-19.7161,-0.25,-8.2407,-36.5,-0.25,-8.5],
// 3 16 -21.688 -0.25 -7.3574 -36.5 -0.25 -8.5 -19.7161 -0.25 -8.2407
  [3,16,-21.688,-0.25,-7.3574,-36.5,-0.25,-8.5,-19.7161,-0.25,-8.2407],
// 3 16 -23.3813 -0.25 -5.9522 -36.5 -0.25 -8.5 -21.688 -0.25 -7.3574
  [3,16,-23.3813,-0.25,-5.9522,-36.5,-0.25,-8.5,-21.688,-0.25,-7.3574],
// 3 16 -24.6806 -0.25 -4.121 -36.5 -0.25 -8.5 -23.3813 -0.25 -5.9522
  [3,16,-24.6806,-0.25,-4.121,-36.5,-0.25,-8.5,-23.3813,-0.25,-5.9522],
// 4 16 -29.4 -0.25 -1.2 -31.5 -0.25 -2 -24.6806 -0.25 -4.121 -25.4974 -0.25 -1.9885
  [4,16,-29.4,-0.25,-1.2,-31.5,-0.25,-2,-24.6806,-0.25,-4.121,-25.4974,-0.25,-1.9885],
// 4 16 -29.4 -0.25 -1.2 -25.4974 -0.25 -1.9885 -25.776 -0.25 0.3 -27.8 -0.25 0.4
  [4,16,-29.4,-0.25,-1.2,-25.4974,-0.25,-1.9885,-25.776,-0.25,0.3,-27.8,-0.25,0.4],
// 4 16 -27.8 -0.25 0.4 -25.776 -0.25 0.3 -25.4974 -0.25 2.5885 -26.8 -0.25 2.6
  [4,16,-27.8,-0.25,0.4,-25.776,-0.25,0.3,-25.4974,-0.25,2.5885,-26.8,-0.25,2.6],
// 4 16 -26.8 -0.25 2.6 -25.4974 -0.25 2.5885 -24.6806 -0.25 4.721 -26.8 -0.25 4.4
  [4,16,-26.8,-0.25,2.6,-25.4974,-0.25,2.5885,-24.6806,-0.25,4.721,-26.8,-0.25,4.4],
// 4 16 -27.8 -0.25 6.6 -26.8 -0.25 4.4 -24.6806 -0.25 4.721 -23.3813 -0.25 6.5522
  [4,16,-27.8,-0.25,6.6,-26.8,-0.25,4.4,-24.6806,-0.25,4.721,-23.3813,-0.25,6.5522],
// 4 16 -27.8 -0.25 6.6 -23.3813 -0.25 6.5522 -21.688 -0.25 7.9574 -29.4 -0.25 8.2
  [4,16,-27.8,-0.25,6.6,-23.3813,-0.25,6.5522,-21.688,-0.25,7.9574,-29.4,-0.25,8.2],
// 4 16 -31.5 -0.25 9 -29.4 -0.25 8.2 -21.688 -0.25 7.9574 -19.7161 -0.25 8.8407
  [4,16,-31.5,-0.25,9,-29.4,-0.25,8.2,-21.688,-0.25,7.9574,-19.7161,-0.25,8.8407],
// 4 16 -44 -0.25 11 -31.5 -0.25 9 -19.7161 -0.25 8.8407 -17.6 -0.25 9.142
  [4,16,-44,-0.25,11,-31.5,-0.25,9,-19.7161,-0.25,8.8407,-17.6,-0.25,9.142],
];
module ldraw_lib__197875a(step=0, col=false, unit=2/5, alt=false, line=0.2, solid=!$preview)
    makepoly(ldraw_lib__197875a(), step=step, col=col, unit=unit, alt=alt, line=line, solid=solid);
ldraw_lib__197875a(line=0.2);
